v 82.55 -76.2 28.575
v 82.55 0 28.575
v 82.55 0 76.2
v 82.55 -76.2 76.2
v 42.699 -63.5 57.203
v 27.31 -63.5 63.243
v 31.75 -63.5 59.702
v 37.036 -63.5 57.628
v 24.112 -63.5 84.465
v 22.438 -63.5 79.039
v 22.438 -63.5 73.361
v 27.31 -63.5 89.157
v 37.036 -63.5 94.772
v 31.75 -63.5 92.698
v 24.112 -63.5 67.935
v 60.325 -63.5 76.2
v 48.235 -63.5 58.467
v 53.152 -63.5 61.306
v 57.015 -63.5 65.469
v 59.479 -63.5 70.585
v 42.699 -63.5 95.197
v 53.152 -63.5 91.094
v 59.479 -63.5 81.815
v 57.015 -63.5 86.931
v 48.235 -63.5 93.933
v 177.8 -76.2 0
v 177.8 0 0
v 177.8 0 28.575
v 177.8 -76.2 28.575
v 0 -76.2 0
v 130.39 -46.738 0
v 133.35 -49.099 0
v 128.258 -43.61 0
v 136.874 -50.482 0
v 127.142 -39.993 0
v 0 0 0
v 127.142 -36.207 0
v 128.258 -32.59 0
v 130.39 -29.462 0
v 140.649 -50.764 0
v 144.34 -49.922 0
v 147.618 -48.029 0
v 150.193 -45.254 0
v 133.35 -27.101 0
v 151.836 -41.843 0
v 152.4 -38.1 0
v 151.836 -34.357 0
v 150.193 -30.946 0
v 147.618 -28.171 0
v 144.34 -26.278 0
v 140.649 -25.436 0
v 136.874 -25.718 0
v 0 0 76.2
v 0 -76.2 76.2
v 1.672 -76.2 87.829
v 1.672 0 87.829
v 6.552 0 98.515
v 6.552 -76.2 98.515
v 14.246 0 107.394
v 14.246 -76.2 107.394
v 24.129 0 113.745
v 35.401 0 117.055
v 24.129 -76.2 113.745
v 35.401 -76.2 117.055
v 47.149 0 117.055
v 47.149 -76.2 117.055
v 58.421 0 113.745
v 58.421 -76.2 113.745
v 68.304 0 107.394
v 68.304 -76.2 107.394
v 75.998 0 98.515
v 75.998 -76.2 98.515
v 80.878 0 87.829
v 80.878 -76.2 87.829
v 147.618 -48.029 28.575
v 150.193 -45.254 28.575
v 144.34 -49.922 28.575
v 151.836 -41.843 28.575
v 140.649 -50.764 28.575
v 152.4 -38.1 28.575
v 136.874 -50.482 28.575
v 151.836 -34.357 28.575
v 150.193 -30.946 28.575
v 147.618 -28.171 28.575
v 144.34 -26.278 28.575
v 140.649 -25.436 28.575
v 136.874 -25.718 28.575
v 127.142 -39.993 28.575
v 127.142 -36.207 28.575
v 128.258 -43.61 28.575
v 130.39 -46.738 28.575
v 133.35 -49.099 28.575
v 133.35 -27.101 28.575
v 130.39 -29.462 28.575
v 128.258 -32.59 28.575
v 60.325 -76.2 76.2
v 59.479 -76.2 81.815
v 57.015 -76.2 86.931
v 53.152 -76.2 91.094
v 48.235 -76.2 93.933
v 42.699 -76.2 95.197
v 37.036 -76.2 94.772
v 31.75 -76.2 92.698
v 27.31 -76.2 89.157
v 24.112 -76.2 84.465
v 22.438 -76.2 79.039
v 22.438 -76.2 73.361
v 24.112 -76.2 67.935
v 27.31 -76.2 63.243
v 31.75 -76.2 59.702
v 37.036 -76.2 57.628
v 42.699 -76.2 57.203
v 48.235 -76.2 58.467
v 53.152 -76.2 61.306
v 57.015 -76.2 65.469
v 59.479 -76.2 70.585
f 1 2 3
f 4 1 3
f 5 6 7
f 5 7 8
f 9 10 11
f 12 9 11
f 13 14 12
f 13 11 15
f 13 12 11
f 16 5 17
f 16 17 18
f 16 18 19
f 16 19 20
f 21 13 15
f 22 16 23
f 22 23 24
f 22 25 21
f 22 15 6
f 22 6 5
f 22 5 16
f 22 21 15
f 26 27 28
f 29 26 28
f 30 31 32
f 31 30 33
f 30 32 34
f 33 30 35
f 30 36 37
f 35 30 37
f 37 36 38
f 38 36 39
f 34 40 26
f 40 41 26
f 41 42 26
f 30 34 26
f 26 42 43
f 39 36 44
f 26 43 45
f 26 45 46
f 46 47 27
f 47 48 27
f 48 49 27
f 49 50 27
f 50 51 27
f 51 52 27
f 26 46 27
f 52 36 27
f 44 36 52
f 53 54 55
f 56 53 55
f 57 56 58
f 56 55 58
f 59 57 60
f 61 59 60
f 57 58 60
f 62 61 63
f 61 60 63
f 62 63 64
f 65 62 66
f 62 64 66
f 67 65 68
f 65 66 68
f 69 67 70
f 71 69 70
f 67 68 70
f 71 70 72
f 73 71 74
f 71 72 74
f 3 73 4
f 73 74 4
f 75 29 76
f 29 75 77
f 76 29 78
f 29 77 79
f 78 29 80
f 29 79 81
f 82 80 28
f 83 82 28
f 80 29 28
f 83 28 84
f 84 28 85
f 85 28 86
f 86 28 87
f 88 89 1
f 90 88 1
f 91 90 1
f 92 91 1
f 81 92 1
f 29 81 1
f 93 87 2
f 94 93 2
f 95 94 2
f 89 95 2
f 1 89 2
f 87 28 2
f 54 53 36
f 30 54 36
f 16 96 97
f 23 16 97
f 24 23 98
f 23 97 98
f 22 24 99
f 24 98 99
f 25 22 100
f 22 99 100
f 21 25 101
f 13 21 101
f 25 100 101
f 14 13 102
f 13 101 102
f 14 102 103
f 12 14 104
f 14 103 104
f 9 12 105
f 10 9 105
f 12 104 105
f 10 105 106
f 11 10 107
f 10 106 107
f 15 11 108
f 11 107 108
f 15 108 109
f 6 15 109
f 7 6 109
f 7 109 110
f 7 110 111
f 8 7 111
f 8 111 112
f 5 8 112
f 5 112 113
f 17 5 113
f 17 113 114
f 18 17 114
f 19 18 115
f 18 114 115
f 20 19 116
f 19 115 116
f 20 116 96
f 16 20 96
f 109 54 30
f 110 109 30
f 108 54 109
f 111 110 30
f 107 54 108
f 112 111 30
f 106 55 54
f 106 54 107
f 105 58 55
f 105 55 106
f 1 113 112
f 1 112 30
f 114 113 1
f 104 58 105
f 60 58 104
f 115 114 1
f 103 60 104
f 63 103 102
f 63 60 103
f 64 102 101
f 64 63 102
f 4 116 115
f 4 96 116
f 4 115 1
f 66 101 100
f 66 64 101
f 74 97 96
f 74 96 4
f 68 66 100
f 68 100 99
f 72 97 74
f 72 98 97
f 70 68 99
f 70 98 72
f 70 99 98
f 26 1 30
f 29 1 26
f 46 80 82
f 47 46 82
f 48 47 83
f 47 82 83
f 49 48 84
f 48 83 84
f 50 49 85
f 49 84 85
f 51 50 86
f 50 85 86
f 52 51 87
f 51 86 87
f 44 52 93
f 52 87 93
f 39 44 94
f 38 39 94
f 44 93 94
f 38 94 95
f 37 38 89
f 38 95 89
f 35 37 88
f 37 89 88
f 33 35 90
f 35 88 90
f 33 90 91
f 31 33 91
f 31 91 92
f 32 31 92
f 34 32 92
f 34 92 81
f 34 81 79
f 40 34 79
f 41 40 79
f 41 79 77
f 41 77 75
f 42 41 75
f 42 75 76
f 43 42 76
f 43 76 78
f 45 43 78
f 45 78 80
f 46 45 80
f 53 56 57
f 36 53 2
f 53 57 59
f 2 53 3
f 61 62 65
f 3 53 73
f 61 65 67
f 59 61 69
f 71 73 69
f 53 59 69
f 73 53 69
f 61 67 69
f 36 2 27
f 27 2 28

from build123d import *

# Parameters (mm, degrees)
F1_DEPTH = 76.2
F2_R     = 19.05
F3_DEPTH = 12.7
F4_DEPTH = 76.2
F5_R     = 12.7
F6_DEPTH = 25374.6


with BuildPart() as f1:
    # F0 (on Front) → F1 (new body)
    with BuildSketch(Plane.XZ):
        Polygon((0, 155.575), (0, 0), (177.8, 0), (177.8, 28.575), (82.55, 28.575), (82.55, 155.575), align=None)
    extrude(amount=F1_DEPTH)

    # F2 (on face) → F3 (cut)
    with BuildSketch(Plane.XZ.offset(76.2)):
        with Locations((41.275, 76.2)):
            Circle(F2_R)
    extrude(amount=-F3_DEPTH, mode=Mode.SUBTRACT)

    # F2 (on face) → F4 (cut)
    with BuildSketch(Plane.XZ.offset(76.2)):
        with BuildLine():
            Line((0, 155.575), (0, 76.2))
            ThreePointArc((0, 76.2), (41.275, 117.475), (82.55, 76.2))
            Line((82.55, 76.2), (82.55, 155.575))
            Line((82.55, 155.575), (0, 155.575))
        make_face()
    extrude(amount=-F4_DEPTH, mode=Mode.SUBTRACT)

    # F5 (on face) → F6 (cut)
    with BuildSketch(Plane.XY.offset(28.575)):
        with Locations((139.7, -38.1)):
            Circle(F5_R)
    extrude(amount=-F6_DEPTH, mode=Mode.SUBTRACT)


solid = f1.part
